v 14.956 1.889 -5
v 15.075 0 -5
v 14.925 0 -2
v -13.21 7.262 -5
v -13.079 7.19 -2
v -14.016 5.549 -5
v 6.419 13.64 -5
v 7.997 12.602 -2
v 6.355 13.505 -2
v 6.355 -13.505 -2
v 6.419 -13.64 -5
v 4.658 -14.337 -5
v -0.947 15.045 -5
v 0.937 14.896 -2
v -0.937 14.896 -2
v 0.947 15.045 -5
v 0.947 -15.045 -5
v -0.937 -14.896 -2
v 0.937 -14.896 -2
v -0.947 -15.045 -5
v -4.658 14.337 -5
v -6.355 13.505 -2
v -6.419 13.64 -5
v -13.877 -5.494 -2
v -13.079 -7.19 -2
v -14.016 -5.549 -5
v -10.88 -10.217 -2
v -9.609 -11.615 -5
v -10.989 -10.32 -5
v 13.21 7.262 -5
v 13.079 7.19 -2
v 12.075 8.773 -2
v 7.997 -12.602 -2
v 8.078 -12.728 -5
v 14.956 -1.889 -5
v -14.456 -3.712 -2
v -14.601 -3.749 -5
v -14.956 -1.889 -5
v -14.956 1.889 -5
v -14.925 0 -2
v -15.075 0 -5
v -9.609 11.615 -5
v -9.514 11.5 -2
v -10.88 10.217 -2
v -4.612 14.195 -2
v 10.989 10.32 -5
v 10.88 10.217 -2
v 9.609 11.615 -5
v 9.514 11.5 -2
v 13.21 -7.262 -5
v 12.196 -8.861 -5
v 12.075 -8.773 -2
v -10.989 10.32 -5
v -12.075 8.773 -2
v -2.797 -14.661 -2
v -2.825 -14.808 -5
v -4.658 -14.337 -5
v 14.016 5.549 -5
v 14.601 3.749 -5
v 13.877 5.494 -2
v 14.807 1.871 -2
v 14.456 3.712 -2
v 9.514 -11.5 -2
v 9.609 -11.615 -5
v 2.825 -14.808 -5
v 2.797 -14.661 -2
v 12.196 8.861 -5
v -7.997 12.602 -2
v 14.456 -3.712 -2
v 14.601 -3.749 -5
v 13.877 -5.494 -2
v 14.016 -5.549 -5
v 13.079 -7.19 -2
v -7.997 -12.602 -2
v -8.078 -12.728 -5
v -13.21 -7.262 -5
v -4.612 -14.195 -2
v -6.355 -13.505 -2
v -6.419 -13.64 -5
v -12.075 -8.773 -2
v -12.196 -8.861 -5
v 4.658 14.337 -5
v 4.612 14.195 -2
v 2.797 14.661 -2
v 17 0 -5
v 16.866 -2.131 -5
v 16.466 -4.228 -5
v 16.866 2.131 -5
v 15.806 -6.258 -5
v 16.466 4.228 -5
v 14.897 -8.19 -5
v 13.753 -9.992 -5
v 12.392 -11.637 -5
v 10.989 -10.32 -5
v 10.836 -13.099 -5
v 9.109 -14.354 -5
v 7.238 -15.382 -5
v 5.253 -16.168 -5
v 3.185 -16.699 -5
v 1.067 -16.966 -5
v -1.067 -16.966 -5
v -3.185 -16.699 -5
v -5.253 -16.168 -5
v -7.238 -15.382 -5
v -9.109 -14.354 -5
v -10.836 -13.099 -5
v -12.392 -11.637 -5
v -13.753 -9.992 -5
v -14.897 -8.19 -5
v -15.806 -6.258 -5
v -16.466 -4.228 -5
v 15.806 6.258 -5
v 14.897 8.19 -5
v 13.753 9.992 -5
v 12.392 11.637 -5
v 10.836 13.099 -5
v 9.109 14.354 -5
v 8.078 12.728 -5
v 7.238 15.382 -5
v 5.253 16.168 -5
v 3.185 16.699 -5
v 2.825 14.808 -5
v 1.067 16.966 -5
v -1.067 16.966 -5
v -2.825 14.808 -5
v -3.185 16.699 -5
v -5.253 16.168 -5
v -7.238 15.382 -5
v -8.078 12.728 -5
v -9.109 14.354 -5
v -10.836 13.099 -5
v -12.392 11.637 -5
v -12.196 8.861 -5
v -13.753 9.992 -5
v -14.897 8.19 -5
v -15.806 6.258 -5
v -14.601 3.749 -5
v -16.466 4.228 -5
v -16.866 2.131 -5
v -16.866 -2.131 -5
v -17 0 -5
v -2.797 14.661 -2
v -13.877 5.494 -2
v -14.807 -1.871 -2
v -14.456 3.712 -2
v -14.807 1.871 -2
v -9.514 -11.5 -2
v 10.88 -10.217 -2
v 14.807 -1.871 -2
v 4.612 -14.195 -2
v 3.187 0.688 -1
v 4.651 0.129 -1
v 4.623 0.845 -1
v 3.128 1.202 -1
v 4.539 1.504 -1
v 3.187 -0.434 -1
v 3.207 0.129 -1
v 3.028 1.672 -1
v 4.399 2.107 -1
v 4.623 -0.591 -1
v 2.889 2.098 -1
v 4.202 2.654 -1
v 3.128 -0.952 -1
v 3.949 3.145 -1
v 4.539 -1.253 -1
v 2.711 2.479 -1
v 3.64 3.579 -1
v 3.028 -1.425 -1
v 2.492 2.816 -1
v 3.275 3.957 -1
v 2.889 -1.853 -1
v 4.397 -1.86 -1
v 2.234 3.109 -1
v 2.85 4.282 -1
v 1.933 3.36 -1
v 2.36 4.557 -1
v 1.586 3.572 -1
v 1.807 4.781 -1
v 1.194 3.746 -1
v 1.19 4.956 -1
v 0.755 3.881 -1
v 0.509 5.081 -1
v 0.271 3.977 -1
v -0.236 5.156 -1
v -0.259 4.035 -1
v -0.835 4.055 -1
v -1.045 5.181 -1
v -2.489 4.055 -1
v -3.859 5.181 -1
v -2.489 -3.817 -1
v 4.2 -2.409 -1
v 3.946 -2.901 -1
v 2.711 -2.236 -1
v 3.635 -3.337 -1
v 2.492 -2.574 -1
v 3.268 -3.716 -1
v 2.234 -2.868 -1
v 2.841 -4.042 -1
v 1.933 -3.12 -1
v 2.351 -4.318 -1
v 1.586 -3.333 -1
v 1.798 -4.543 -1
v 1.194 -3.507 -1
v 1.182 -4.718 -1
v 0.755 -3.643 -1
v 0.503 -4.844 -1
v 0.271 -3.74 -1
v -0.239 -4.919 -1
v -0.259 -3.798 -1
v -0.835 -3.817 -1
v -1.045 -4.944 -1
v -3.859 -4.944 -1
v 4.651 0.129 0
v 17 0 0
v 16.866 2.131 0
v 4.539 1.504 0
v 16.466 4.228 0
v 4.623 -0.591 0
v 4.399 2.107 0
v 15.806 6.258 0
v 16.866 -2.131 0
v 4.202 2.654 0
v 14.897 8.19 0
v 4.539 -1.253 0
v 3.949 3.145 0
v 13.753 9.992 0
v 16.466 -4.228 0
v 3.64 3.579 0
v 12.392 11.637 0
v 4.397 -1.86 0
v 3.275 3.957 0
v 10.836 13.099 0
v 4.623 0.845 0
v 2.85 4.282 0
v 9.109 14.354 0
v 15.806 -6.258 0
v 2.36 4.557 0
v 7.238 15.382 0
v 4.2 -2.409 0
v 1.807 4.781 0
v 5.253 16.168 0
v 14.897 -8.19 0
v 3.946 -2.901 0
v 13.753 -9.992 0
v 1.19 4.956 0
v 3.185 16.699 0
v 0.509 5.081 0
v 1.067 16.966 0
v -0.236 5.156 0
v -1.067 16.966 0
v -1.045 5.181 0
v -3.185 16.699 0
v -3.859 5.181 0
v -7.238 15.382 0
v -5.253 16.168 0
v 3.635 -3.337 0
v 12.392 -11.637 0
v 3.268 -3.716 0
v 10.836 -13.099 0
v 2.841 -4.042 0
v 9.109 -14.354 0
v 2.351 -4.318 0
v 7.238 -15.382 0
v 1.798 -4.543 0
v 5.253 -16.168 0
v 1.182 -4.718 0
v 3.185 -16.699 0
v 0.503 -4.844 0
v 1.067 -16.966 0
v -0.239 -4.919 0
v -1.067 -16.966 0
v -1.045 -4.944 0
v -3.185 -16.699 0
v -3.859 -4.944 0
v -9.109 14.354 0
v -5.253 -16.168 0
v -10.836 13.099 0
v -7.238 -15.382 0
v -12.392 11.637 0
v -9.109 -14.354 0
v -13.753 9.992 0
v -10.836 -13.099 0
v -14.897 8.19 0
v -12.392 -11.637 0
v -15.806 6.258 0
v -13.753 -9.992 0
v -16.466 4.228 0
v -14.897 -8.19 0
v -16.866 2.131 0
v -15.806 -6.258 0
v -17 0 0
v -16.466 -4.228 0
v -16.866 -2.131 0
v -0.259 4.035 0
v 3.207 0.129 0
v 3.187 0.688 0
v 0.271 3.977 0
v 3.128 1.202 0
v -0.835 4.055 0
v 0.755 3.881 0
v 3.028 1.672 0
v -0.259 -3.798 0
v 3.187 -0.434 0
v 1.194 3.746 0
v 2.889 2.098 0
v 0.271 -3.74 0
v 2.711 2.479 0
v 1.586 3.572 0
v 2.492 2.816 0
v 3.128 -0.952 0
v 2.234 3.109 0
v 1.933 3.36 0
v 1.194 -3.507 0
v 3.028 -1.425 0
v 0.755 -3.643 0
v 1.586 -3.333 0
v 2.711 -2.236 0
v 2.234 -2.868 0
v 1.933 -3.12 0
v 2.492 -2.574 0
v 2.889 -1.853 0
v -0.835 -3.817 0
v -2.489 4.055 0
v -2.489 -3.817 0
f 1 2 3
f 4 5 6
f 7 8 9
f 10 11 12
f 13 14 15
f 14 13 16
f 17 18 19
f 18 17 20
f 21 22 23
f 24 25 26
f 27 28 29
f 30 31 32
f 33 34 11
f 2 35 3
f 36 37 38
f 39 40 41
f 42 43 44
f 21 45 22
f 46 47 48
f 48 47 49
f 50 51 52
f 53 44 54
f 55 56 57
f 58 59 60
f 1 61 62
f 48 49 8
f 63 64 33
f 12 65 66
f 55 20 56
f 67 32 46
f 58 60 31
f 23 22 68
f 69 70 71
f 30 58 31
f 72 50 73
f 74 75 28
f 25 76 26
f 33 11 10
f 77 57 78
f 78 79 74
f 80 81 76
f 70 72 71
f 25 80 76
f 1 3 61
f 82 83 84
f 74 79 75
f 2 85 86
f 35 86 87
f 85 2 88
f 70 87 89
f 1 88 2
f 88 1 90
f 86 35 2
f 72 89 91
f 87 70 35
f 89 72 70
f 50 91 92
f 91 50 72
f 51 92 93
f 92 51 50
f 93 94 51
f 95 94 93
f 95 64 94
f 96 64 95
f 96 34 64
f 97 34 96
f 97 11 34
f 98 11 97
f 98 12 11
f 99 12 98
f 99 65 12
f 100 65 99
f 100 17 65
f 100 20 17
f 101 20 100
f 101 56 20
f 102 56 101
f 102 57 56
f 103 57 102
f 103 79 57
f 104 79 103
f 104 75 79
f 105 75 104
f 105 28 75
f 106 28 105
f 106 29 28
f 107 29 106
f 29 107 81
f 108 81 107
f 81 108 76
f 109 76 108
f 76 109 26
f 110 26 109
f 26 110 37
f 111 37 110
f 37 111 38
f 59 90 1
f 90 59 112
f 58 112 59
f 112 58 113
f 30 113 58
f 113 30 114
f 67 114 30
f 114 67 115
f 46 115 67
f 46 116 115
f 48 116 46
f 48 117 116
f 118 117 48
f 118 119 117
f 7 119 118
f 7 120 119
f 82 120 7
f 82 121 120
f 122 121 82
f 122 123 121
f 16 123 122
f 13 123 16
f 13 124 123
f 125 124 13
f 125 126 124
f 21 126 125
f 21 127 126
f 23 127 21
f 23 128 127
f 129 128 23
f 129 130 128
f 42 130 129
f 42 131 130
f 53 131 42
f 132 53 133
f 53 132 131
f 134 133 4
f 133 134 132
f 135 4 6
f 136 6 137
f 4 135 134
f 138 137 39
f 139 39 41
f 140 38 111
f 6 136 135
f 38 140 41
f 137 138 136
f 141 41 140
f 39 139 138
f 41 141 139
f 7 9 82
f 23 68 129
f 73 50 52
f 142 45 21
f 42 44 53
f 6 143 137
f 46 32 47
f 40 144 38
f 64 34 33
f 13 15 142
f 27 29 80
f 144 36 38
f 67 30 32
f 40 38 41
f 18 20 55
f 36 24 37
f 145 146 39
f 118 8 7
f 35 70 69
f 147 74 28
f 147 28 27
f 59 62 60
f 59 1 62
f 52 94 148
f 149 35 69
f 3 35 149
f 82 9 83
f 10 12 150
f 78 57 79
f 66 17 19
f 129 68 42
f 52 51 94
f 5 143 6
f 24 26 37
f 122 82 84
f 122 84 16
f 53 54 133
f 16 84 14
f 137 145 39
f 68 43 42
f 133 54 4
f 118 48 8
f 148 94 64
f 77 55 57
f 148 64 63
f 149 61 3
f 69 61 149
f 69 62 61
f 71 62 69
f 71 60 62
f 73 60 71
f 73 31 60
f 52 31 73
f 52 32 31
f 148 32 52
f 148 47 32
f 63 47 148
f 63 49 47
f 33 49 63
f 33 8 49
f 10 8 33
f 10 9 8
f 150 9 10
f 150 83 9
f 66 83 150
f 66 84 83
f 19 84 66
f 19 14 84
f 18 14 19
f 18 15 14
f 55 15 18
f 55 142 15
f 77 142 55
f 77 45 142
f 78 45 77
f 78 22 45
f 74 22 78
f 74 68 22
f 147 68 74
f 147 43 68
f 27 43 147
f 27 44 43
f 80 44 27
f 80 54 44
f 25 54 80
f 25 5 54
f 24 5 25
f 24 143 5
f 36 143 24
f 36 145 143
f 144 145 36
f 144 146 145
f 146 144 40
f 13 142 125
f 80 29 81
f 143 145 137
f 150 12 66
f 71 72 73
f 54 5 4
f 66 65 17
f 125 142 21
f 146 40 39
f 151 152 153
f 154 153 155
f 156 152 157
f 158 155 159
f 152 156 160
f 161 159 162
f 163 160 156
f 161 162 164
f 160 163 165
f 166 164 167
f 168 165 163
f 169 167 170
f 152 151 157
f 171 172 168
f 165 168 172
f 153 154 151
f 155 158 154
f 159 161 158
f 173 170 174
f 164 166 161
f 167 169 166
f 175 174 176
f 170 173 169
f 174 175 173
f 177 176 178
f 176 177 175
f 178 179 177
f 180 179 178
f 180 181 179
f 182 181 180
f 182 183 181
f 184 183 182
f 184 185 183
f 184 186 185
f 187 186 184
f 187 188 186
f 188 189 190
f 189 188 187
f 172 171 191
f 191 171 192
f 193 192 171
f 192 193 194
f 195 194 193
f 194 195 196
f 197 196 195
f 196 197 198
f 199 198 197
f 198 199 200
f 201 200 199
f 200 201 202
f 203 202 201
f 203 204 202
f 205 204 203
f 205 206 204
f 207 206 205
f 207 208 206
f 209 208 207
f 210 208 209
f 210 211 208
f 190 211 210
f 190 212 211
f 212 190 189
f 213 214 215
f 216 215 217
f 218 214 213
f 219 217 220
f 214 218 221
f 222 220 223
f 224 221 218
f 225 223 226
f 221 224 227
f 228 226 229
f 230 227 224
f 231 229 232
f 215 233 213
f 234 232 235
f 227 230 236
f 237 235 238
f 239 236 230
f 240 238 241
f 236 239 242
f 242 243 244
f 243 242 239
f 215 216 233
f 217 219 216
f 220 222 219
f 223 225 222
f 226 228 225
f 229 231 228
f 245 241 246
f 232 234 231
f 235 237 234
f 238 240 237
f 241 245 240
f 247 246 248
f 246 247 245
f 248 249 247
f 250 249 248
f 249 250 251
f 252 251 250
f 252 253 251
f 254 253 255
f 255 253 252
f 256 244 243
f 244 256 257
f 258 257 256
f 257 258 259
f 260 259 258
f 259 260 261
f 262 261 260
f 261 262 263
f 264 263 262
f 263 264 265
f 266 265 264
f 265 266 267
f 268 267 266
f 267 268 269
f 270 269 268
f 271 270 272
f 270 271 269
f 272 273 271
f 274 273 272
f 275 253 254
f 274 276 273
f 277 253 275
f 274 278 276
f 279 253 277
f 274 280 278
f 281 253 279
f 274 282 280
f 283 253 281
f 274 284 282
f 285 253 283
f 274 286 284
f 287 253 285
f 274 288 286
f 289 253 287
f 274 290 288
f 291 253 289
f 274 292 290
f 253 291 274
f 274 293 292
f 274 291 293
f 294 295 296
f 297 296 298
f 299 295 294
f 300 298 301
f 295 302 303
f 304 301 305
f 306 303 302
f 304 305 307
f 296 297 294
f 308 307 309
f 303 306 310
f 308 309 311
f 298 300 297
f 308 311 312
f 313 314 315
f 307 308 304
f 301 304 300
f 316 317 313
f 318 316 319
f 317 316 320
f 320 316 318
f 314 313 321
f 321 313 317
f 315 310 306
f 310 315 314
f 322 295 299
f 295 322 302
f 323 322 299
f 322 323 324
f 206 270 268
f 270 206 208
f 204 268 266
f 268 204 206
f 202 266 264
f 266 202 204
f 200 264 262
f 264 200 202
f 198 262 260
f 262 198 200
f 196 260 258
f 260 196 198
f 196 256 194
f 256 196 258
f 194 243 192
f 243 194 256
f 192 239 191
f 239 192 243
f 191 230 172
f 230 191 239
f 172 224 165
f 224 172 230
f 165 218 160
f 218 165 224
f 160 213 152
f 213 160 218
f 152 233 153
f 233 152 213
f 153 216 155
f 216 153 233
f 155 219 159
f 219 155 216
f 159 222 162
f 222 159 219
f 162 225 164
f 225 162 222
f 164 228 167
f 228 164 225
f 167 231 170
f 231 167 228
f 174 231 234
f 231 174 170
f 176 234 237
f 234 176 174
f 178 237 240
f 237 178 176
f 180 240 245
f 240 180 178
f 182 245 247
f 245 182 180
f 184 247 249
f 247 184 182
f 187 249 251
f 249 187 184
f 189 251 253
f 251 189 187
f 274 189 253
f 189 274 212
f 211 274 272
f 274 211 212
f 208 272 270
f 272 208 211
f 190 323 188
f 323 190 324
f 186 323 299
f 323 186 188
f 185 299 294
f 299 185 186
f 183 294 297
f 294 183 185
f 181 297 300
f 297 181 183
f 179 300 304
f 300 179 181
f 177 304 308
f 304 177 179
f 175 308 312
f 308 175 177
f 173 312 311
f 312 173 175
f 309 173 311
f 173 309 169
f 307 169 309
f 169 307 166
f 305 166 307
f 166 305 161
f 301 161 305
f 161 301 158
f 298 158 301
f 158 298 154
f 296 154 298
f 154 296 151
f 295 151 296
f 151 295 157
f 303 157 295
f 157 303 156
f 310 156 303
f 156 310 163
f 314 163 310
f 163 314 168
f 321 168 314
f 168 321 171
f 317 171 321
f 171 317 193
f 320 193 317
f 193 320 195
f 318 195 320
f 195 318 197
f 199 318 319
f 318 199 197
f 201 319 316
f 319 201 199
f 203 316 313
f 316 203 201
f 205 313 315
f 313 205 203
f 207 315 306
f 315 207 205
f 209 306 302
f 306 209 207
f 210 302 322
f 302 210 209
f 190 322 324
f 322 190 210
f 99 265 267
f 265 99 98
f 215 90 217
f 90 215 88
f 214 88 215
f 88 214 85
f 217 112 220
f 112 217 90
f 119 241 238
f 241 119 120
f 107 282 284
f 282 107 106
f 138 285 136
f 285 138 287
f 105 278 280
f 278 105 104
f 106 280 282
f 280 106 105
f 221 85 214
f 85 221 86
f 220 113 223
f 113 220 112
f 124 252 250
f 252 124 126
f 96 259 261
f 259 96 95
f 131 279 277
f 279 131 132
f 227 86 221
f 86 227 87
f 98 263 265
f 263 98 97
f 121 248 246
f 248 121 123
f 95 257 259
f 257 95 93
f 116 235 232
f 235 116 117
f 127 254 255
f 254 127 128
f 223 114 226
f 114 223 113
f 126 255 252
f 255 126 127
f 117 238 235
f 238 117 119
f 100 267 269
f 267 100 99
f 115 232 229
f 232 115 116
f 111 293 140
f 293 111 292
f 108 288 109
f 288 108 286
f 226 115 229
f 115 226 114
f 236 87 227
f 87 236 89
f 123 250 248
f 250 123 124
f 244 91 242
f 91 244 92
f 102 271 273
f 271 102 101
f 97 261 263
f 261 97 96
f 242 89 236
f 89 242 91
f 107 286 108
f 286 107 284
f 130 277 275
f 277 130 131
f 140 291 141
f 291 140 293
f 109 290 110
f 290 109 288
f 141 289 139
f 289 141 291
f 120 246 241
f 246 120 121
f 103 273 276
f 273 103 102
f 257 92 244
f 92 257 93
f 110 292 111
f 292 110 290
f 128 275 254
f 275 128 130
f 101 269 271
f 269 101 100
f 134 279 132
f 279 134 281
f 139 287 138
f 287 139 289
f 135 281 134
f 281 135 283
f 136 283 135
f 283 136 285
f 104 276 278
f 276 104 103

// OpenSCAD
$fn = 50;

difference() {
	union() {
		translate(v = [0, 0, -5.0]) {
			cylinder(h = 5, r = 17.0);
		}
	}
	union() {
		#translate(v = [0, 0, -5.0]) {
			cylinder(h = 3, r1 = 15.075, r2 = 14.925);
		}
		translate(v = [0, 0, -1]) {
			linear_extrude(height = 1) {
				text(font = "Impact", halign = "center", size = 10, text = "D", valign = "center");
			}
		}
	}
}
